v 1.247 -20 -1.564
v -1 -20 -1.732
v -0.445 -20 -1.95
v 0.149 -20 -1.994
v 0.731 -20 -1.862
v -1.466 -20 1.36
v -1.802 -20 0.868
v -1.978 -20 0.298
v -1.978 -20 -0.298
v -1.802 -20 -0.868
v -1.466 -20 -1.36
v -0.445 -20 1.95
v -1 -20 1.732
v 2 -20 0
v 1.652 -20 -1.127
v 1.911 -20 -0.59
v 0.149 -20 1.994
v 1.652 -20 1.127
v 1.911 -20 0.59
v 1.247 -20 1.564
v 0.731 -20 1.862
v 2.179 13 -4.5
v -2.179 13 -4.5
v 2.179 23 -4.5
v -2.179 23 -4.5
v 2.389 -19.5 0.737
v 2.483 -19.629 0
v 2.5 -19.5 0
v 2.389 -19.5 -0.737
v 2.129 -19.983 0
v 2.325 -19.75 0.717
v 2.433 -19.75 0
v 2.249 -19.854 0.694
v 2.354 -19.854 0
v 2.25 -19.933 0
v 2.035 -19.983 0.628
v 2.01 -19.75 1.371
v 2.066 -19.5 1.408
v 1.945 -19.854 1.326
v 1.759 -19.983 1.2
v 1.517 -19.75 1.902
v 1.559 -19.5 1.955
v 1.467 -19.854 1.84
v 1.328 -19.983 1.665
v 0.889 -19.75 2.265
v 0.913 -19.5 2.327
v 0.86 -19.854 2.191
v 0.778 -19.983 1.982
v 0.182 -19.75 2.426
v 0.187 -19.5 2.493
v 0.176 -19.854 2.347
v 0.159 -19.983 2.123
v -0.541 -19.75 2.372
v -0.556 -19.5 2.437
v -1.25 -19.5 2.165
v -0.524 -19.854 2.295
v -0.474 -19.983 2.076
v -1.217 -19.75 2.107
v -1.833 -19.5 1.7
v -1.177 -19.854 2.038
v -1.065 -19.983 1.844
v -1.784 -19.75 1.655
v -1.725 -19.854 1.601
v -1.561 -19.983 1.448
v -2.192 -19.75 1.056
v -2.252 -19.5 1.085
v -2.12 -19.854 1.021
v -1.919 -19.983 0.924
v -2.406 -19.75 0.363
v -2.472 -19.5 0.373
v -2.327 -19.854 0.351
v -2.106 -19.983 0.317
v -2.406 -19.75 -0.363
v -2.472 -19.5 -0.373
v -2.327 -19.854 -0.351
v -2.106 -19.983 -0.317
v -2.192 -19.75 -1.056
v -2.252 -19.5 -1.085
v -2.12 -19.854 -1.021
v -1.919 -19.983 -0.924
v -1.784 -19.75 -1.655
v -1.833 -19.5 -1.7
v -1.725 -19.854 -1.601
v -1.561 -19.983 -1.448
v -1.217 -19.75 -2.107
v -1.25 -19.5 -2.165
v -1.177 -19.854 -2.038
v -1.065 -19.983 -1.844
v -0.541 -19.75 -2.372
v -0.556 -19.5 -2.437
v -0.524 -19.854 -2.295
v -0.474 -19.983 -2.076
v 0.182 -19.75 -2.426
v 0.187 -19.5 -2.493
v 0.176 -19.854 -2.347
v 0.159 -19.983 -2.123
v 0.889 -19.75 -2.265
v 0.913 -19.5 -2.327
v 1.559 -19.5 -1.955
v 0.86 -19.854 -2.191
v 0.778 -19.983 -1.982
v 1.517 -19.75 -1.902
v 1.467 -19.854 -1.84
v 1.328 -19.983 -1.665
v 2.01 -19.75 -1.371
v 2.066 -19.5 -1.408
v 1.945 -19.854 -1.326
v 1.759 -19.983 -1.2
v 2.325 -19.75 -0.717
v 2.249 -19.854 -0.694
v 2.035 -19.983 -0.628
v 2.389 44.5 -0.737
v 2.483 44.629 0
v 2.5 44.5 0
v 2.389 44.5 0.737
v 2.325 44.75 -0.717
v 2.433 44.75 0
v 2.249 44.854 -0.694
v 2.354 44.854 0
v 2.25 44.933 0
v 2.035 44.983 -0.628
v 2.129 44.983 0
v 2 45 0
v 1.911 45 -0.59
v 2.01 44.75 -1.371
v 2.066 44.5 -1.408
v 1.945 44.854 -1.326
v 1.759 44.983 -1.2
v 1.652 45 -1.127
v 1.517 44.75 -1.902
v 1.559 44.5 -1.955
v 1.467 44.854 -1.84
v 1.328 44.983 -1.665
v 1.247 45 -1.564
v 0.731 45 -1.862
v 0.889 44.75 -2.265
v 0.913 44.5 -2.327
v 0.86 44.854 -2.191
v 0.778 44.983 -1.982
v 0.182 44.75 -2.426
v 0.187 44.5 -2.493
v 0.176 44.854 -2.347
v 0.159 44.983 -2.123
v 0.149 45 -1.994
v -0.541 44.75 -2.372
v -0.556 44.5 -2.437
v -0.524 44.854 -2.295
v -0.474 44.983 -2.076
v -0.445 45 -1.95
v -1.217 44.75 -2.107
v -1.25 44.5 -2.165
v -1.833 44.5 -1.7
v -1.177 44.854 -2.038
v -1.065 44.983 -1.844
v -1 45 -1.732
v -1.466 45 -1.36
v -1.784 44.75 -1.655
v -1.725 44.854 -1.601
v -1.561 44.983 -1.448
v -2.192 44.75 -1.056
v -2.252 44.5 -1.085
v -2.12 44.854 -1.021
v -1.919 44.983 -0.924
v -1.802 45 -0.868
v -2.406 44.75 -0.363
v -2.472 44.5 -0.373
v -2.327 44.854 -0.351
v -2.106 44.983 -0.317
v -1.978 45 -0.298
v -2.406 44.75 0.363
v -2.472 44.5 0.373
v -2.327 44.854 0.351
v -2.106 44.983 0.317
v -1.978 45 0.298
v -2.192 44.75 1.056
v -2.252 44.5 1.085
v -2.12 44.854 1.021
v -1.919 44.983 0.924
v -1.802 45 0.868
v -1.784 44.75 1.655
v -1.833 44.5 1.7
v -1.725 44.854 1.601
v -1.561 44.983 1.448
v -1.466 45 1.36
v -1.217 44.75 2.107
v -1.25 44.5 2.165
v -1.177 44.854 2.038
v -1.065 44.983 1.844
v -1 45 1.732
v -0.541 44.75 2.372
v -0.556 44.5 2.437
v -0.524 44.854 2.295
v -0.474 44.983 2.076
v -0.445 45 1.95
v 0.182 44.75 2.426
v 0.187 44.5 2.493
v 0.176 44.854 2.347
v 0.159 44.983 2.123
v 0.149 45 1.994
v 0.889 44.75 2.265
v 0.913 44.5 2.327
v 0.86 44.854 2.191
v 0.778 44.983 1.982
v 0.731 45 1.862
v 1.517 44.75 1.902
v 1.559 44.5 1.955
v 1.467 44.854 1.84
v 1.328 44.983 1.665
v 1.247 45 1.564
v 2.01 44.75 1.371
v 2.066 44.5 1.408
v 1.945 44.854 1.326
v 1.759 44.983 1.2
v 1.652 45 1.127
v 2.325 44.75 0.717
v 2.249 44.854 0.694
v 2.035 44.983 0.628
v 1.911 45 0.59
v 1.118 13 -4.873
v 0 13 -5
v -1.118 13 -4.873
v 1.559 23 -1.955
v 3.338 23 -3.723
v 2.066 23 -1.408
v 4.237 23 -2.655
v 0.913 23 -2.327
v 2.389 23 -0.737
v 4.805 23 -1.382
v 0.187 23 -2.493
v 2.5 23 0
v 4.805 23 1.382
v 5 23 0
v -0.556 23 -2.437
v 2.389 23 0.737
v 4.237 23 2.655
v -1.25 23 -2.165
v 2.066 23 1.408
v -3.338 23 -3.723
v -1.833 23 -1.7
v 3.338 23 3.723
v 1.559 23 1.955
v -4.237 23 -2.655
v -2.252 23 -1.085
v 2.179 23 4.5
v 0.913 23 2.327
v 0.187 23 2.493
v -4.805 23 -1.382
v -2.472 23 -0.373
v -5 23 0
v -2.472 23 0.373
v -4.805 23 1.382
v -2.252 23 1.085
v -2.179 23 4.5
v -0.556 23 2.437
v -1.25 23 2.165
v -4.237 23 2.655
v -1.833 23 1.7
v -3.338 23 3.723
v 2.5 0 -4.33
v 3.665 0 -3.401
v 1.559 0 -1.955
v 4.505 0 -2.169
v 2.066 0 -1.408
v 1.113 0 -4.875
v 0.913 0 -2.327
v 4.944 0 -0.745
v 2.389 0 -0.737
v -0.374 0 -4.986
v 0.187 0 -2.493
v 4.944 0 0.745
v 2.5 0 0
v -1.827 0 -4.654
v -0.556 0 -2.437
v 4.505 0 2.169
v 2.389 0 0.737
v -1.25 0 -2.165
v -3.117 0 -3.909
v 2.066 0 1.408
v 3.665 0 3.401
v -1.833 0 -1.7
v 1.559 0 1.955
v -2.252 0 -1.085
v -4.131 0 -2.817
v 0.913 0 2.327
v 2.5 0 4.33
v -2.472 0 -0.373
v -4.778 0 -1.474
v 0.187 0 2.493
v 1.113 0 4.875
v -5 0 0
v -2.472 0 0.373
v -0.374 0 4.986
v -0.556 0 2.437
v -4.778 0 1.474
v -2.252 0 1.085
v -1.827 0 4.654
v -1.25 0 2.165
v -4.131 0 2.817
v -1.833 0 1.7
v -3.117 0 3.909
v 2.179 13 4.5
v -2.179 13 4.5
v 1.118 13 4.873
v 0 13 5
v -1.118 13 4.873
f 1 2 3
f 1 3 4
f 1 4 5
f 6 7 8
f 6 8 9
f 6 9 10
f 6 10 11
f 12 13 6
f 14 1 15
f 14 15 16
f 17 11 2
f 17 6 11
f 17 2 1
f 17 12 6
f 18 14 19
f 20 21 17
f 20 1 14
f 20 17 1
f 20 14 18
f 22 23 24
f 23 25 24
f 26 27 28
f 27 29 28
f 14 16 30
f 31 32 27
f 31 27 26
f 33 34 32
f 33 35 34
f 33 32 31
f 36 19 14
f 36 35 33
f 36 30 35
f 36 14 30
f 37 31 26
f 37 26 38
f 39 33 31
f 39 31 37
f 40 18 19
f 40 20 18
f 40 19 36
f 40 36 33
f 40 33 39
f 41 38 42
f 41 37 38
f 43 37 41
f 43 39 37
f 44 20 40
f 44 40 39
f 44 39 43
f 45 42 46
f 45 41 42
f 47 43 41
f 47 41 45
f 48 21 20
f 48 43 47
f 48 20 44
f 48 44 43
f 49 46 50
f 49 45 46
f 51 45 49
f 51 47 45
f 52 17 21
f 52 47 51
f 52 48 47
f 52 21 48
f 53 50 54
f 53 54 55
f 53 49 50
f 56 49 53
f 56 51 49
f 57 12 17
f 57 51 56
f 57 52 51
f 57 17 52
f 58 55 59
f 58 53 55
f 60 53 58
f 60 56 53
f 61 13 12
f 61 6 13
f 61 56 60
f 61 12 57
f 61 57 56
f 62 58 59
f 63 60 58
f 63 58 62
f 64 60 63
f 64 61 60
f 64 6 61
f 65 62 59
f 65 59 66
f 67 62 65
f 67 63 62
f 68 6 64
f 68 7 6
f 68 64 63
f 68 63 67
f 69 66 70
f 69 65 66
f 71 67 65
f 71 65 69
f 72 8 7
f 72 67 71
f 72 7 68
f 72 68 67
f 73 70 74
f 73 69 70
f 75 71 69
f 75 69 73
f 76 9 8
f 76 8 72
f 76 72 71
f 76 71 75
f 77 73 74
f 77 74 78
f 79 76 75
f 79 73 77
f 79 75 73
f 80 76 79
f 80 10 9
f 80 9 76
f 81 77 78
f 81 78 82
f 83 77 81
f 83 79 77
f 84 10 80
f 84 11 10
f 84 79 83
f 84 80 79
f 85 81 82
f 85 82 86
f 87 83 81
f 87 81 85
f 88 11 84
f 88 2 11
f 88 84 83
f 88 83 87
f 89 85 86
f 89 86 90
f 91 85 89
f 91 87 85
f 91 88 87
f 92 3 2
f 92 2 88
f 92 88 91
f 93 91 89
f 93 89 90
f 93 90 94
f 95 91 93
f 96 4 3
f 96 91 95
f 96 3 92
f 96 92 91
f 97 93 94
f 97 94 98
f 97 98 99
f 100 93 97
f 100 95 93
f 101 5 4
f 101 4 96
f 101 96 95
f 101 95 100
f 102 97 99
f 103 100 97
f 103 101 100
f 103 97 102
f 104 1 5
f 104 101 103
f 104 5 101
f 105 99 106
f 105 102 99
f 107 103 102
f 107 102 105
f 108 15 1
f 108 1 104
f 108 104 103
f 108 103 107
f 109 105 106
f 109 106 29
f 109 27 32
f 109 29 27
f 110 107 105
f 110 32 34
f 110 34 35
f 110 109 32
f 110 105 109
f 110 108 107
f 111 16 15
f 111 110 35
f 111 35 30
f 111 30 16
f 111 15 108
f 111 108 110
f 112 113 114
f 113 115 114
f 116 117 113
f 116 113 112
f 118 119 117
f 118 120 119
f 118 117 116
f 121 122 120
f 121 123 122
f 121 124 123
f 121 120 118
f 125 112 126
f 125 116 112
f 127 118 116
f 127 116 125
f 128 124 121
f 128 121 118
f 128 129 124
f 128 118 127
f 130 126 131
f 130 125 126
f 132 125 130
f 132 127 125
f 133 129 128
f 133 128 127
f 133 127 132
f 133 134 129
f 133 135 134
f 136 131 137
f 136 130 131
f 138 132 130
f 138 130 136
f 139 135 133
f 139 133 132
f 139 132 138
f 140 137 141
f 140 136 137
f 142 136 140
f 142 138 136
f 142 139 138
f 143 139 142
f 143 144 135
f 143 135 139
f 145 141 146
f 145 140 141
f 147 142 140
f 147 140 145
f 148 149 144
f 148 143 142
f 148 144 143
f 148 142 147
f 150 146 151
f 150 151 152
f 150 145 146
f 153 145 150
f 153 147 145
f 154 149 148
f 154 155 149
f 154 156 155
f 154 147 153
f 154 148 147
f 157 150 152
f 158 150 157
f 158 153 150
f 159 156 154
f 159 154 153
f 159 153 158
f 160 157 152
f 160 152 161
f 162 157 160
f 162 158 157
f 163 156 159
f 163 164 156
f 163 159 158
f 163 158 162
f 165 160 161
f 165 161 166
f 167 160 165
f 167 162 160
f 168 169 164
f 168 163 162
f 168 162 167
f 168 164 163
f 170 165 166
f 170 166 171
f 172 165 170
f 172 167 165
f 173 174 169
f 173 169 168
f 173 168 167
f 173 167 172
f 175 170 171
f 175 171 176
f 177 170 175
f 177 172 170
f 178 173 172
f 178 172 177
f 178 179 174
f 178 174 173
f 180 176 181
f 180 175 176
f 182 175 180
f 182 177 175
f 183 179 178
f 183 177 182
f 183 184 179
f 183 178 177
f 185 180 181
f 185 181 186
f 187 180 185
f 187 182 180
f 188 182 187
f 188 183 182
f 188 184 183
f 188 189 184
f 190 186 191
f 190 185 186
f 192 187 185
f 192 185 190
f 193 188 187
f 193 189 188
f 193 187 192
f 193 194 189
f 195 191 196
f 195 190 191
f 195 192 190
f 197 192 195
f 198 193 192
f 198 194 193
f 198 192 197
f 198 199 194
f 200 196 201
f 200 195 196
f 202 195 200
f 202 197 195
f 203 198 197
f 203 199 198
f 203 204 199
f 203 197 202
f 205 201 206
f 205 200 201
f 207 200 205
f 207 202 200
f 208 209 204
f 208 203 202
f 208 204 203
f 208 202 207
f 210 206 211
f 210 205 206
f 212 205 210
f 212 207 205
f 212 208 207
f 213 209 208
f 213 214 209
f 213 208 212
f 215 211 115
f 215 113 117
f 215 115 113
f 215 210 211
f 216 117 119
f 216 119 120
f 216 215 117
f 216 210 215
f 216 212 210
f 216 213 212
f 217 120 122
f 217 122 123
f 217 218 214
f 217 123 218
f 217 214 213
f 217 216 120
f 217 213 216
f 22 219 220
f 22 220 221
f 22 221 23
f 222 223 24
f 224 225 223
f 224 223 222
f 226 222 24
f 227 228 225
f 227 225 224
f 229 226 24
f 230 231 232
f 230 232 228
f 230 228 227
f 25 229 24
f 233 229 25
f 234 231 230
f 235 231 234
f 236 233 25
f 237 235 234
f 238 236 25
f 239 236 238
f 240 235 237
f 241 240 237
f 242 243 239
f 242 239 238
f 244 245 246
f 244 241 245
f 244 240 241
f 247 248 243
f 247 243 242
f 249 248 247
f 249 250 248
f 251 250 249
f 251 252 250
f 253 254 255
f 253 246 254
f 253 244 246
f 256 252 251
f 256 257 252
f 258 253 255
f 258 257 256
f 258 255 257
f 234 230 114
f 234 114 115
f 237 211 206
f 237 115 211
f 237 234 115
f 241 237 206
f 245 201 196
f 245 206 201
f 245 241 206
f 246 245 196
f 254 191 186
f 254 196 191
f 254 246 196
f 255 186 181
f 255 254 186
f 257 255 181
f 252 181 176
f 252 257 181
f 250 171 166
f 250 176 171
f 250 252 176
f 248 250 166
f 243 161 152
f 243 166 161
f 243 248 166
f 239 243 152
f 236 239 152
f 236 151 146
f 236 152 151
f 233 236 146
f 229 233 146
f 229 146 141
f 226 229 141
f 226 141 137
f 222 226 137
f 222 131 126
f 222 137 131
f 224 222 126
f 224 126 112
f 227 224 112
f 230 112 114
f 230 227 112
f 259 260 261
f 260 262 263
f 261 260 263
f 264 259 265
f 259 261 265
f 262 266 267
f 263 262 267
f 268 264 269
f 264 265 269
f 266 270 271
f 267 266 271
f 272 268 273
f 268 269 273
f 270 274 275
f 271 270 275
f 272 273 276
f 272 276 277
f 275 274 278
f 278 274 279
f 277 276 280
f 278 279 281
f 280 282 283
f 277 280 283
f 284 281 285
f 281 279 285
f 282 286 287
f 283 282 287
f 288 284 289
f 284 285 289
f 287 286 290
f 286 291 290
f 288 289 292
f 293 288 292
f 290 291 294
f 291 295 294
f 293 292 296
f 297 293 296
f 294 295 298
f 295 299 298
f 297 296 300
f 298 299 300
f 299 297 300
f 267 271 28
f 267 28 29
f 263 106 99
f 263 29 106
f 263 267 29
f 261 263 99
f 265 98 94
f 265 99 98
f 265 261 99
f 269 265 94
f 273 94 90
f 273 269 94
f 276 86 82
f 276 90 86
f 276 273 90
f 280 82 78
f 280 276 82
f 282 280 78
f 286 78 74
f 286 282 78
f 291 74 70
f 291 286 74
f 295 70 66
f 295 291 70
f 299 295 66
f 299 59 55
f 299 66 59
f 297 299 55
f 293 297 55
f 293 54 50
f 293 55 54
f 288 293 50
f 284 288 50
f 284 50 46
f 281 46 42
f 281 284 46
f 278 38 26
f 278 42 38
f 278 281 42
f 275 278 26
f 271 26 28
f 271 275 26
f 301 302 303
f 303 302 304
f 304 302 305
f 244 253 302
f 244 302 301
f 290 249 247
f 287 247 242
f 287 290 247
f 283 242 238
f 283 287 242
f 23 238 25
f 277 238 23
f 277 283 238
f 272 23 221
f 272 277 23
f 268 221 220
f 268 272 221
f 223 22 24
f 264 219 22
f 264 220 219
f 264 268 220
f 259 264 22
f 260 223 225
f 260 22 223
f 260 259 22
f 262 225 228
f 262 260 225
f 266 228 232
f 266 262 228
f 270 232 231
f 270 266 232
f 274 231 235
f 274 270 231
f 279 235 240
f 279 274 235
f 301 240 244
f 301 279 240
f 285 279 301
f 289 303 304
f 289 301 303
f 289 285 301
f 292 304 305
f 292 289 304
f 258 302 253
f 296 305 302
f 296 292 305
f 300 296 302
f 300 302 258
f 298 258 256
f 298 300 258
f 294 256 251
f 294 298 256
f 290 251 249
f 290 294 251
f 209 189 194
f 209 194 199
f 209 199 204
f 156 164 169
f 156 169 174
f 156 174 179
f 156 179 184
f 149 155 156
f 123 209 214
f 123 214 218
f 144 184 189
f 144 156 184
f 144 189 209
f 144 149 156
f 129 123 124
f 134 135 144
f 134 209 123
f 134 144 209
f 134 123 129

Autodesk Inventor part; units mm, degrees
ref_plane "YZ Plane" through (0, 0, 0) normal (1, 0, 0) x (0, 1, 0)
ref_plane "XZ Plane" through (0, 0, 0) normal (0, 1, 0) x (-1, 0, 0)
ref_plane "XY Plane" through (0, 0, 0) normal (0, 0, 1) x (1, 0, 0)
sketch "Sketch1" plane through (0, 0, 0) normal (0, 1, 0) x (-1, 0, 0)
  circle A0 centre (0, 0) radius 5
  dimension "d0" = 10
extrude "Extrusion1" add sketch "Sketch1" along normal blind 23
sketch "Sketch2" plane through (0, 23, 0) normal (0, 1, 0) x (1, 0, 0)
  line L0 (0, -4.5) -> (0, 4.5) construction
  circle A0 centre (0, 0) radius 5 projected
  line L1 (-2.1794, -4.5) -> (2.1794, -4.5)
  line L2 (-2.1794, 4.5) -> (2.1794, 4.5)
extrude "Extrusion2" cut sketch "Sketch2" against normal blind 10 contours L2 A0 | A0 L1
sketch "Sketch3" plane through (0, 23, 0) normal (0, 1, 0) x (1, 0, 0)
  circle A0 centre (0, 0) radius 2.5
  dimension "d7" = 5
extrude "Extrusion3" add sketch "Sketch3" along normal blind 22
sketch "Sketch4" plane through (0, 0, 0) normal (0, -1, 0) x (1, 0, 0)
  circle A0 centre (0, 0) radius 2.5 projected
  circle A1 centre (0, 0) radius 3
  dimension "d10" = 6
extrude "Extrusion4" add sketch "Sketch4" along normal blind 20 contours A0
thread "Thread1" size "M5x0.8" class "6g" standard "ANSI Metric M Profile" length 10
fillet "Fillet1" radius 0.5 1 edges at (-2.5, 45, 0)
thread "Thread2" size "M5x0.8" class "6g" standard "ANSI Metric M Profile" length 12
fillet "Fillet2" radius 0.5 1 edges at (-2.5, -20, 0)
properties part number "Semi alberto M"
